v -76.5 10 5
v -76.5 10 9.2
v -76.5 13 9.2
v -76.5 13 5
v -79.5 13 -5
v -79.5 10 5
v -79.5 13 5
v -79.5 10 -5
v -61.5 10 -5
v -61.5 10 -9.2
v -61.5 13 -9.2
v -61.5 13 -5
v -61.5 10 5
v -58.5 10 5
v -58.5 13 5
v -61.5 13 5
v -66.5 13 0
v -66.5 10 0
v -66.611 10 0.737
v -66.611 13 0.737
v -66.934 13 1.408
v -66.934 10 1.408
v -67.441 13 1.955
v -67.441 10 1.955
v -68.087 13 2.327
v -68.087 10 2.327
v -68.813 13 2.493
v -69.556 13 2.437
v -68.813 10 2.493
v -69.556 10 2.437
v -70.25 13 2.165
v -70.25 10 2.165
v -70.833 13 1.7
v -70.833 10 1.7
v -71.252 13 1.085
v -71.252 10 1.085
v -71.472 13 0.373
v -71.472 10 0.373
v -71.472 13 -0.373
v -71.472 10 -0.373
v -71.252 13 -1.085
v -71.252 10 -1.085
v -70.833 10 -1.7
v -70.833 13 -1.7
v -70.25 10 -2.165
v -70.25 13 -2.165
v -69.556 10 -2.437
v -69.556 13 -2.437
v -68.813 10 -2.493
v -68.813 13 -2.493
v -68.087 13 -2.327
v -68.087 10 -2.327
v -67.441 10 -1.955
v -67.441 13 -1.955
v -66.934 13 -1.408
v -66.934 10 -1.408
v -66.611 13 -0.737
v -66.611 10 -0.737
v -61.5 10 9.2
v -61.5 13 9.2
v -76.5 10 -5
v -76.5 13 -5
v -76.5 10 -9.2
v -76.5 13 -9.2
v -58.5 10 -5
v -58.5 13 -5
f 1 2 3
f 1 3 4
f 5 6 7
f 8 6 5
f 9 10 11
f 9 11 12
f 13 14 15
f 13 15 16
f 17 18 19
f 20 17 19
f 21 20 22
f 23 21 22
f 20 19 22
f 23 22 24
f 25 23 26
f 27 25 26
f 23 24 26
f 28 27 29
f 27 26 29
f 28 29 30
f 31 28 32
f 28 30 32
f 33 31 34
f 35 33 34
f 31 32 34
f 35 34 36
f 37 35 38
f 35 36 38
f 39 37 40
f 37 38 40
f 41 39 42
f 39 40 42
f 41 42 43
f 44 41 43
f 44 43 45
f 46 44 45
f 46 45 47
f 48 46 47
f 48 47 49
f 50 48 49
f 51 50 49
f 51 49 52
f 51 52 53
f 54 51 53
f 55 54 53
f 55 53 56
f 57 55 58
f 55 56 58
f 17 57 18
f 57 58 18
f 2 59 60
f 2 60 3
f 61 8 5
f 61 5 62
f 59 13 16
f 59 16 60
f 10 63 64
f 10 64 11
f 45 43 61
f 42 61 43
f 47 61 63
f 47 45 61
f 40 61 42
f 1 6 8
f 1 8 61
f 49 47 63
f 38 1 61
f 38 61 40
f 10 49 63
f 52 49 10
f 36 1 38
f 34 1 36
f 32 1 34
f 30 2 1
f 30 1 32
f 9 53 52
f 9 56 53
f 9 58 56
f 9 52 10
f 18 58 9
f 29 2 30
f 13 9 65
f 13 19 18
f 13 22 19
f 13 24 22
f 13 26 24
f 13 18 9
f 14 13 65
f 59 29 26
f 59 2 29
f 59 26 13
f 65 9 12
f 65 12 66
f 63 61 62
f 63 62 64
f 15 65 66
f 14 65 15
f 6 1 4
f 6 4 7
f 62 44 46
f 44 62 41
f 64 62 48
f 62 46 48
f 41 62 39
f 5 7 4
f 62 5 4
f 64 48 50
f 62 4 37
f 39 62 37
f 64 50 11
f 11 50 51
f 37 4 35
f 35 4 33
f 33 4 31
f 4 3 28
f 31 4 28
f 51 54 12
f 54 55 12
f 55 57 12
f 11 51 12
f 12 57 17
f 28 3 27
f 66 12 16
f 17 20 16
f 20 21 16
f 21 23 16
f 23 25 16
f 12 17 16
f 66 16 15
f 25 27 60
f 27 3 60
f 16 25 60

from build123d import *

# Parameters (mm, degrees)
ESBO_O1_R                = 2.5
RESSALTO_EXTRUS_O1_DEPTH = 3


with BuildPart() as part:
    # Esboço1 → Ressalto-extrusão1 (new body)
    with BuildSketch(Plane.XZ.offset(-10)):
        Polygon((-61.5, -9.199919627), (-61.5, -5), (-58.5, -5), (-58.5, 5), (-61.5, 5), (-61.5, 9.199919627), (-76.5, 9.199919627), (-76.5, 5), (-79.5, 5), (-79.5, -5), (-76.5, -5), (-76.5, -9.199919627), align=None)
        with Locations((-69, 0)):
            Circle(ESBO_O1_R, mode=Mode.SUBTRACT)
    extrude(amount=-RESSALTO_EXTRUS_O1_DEPTH)


solid = part.part
